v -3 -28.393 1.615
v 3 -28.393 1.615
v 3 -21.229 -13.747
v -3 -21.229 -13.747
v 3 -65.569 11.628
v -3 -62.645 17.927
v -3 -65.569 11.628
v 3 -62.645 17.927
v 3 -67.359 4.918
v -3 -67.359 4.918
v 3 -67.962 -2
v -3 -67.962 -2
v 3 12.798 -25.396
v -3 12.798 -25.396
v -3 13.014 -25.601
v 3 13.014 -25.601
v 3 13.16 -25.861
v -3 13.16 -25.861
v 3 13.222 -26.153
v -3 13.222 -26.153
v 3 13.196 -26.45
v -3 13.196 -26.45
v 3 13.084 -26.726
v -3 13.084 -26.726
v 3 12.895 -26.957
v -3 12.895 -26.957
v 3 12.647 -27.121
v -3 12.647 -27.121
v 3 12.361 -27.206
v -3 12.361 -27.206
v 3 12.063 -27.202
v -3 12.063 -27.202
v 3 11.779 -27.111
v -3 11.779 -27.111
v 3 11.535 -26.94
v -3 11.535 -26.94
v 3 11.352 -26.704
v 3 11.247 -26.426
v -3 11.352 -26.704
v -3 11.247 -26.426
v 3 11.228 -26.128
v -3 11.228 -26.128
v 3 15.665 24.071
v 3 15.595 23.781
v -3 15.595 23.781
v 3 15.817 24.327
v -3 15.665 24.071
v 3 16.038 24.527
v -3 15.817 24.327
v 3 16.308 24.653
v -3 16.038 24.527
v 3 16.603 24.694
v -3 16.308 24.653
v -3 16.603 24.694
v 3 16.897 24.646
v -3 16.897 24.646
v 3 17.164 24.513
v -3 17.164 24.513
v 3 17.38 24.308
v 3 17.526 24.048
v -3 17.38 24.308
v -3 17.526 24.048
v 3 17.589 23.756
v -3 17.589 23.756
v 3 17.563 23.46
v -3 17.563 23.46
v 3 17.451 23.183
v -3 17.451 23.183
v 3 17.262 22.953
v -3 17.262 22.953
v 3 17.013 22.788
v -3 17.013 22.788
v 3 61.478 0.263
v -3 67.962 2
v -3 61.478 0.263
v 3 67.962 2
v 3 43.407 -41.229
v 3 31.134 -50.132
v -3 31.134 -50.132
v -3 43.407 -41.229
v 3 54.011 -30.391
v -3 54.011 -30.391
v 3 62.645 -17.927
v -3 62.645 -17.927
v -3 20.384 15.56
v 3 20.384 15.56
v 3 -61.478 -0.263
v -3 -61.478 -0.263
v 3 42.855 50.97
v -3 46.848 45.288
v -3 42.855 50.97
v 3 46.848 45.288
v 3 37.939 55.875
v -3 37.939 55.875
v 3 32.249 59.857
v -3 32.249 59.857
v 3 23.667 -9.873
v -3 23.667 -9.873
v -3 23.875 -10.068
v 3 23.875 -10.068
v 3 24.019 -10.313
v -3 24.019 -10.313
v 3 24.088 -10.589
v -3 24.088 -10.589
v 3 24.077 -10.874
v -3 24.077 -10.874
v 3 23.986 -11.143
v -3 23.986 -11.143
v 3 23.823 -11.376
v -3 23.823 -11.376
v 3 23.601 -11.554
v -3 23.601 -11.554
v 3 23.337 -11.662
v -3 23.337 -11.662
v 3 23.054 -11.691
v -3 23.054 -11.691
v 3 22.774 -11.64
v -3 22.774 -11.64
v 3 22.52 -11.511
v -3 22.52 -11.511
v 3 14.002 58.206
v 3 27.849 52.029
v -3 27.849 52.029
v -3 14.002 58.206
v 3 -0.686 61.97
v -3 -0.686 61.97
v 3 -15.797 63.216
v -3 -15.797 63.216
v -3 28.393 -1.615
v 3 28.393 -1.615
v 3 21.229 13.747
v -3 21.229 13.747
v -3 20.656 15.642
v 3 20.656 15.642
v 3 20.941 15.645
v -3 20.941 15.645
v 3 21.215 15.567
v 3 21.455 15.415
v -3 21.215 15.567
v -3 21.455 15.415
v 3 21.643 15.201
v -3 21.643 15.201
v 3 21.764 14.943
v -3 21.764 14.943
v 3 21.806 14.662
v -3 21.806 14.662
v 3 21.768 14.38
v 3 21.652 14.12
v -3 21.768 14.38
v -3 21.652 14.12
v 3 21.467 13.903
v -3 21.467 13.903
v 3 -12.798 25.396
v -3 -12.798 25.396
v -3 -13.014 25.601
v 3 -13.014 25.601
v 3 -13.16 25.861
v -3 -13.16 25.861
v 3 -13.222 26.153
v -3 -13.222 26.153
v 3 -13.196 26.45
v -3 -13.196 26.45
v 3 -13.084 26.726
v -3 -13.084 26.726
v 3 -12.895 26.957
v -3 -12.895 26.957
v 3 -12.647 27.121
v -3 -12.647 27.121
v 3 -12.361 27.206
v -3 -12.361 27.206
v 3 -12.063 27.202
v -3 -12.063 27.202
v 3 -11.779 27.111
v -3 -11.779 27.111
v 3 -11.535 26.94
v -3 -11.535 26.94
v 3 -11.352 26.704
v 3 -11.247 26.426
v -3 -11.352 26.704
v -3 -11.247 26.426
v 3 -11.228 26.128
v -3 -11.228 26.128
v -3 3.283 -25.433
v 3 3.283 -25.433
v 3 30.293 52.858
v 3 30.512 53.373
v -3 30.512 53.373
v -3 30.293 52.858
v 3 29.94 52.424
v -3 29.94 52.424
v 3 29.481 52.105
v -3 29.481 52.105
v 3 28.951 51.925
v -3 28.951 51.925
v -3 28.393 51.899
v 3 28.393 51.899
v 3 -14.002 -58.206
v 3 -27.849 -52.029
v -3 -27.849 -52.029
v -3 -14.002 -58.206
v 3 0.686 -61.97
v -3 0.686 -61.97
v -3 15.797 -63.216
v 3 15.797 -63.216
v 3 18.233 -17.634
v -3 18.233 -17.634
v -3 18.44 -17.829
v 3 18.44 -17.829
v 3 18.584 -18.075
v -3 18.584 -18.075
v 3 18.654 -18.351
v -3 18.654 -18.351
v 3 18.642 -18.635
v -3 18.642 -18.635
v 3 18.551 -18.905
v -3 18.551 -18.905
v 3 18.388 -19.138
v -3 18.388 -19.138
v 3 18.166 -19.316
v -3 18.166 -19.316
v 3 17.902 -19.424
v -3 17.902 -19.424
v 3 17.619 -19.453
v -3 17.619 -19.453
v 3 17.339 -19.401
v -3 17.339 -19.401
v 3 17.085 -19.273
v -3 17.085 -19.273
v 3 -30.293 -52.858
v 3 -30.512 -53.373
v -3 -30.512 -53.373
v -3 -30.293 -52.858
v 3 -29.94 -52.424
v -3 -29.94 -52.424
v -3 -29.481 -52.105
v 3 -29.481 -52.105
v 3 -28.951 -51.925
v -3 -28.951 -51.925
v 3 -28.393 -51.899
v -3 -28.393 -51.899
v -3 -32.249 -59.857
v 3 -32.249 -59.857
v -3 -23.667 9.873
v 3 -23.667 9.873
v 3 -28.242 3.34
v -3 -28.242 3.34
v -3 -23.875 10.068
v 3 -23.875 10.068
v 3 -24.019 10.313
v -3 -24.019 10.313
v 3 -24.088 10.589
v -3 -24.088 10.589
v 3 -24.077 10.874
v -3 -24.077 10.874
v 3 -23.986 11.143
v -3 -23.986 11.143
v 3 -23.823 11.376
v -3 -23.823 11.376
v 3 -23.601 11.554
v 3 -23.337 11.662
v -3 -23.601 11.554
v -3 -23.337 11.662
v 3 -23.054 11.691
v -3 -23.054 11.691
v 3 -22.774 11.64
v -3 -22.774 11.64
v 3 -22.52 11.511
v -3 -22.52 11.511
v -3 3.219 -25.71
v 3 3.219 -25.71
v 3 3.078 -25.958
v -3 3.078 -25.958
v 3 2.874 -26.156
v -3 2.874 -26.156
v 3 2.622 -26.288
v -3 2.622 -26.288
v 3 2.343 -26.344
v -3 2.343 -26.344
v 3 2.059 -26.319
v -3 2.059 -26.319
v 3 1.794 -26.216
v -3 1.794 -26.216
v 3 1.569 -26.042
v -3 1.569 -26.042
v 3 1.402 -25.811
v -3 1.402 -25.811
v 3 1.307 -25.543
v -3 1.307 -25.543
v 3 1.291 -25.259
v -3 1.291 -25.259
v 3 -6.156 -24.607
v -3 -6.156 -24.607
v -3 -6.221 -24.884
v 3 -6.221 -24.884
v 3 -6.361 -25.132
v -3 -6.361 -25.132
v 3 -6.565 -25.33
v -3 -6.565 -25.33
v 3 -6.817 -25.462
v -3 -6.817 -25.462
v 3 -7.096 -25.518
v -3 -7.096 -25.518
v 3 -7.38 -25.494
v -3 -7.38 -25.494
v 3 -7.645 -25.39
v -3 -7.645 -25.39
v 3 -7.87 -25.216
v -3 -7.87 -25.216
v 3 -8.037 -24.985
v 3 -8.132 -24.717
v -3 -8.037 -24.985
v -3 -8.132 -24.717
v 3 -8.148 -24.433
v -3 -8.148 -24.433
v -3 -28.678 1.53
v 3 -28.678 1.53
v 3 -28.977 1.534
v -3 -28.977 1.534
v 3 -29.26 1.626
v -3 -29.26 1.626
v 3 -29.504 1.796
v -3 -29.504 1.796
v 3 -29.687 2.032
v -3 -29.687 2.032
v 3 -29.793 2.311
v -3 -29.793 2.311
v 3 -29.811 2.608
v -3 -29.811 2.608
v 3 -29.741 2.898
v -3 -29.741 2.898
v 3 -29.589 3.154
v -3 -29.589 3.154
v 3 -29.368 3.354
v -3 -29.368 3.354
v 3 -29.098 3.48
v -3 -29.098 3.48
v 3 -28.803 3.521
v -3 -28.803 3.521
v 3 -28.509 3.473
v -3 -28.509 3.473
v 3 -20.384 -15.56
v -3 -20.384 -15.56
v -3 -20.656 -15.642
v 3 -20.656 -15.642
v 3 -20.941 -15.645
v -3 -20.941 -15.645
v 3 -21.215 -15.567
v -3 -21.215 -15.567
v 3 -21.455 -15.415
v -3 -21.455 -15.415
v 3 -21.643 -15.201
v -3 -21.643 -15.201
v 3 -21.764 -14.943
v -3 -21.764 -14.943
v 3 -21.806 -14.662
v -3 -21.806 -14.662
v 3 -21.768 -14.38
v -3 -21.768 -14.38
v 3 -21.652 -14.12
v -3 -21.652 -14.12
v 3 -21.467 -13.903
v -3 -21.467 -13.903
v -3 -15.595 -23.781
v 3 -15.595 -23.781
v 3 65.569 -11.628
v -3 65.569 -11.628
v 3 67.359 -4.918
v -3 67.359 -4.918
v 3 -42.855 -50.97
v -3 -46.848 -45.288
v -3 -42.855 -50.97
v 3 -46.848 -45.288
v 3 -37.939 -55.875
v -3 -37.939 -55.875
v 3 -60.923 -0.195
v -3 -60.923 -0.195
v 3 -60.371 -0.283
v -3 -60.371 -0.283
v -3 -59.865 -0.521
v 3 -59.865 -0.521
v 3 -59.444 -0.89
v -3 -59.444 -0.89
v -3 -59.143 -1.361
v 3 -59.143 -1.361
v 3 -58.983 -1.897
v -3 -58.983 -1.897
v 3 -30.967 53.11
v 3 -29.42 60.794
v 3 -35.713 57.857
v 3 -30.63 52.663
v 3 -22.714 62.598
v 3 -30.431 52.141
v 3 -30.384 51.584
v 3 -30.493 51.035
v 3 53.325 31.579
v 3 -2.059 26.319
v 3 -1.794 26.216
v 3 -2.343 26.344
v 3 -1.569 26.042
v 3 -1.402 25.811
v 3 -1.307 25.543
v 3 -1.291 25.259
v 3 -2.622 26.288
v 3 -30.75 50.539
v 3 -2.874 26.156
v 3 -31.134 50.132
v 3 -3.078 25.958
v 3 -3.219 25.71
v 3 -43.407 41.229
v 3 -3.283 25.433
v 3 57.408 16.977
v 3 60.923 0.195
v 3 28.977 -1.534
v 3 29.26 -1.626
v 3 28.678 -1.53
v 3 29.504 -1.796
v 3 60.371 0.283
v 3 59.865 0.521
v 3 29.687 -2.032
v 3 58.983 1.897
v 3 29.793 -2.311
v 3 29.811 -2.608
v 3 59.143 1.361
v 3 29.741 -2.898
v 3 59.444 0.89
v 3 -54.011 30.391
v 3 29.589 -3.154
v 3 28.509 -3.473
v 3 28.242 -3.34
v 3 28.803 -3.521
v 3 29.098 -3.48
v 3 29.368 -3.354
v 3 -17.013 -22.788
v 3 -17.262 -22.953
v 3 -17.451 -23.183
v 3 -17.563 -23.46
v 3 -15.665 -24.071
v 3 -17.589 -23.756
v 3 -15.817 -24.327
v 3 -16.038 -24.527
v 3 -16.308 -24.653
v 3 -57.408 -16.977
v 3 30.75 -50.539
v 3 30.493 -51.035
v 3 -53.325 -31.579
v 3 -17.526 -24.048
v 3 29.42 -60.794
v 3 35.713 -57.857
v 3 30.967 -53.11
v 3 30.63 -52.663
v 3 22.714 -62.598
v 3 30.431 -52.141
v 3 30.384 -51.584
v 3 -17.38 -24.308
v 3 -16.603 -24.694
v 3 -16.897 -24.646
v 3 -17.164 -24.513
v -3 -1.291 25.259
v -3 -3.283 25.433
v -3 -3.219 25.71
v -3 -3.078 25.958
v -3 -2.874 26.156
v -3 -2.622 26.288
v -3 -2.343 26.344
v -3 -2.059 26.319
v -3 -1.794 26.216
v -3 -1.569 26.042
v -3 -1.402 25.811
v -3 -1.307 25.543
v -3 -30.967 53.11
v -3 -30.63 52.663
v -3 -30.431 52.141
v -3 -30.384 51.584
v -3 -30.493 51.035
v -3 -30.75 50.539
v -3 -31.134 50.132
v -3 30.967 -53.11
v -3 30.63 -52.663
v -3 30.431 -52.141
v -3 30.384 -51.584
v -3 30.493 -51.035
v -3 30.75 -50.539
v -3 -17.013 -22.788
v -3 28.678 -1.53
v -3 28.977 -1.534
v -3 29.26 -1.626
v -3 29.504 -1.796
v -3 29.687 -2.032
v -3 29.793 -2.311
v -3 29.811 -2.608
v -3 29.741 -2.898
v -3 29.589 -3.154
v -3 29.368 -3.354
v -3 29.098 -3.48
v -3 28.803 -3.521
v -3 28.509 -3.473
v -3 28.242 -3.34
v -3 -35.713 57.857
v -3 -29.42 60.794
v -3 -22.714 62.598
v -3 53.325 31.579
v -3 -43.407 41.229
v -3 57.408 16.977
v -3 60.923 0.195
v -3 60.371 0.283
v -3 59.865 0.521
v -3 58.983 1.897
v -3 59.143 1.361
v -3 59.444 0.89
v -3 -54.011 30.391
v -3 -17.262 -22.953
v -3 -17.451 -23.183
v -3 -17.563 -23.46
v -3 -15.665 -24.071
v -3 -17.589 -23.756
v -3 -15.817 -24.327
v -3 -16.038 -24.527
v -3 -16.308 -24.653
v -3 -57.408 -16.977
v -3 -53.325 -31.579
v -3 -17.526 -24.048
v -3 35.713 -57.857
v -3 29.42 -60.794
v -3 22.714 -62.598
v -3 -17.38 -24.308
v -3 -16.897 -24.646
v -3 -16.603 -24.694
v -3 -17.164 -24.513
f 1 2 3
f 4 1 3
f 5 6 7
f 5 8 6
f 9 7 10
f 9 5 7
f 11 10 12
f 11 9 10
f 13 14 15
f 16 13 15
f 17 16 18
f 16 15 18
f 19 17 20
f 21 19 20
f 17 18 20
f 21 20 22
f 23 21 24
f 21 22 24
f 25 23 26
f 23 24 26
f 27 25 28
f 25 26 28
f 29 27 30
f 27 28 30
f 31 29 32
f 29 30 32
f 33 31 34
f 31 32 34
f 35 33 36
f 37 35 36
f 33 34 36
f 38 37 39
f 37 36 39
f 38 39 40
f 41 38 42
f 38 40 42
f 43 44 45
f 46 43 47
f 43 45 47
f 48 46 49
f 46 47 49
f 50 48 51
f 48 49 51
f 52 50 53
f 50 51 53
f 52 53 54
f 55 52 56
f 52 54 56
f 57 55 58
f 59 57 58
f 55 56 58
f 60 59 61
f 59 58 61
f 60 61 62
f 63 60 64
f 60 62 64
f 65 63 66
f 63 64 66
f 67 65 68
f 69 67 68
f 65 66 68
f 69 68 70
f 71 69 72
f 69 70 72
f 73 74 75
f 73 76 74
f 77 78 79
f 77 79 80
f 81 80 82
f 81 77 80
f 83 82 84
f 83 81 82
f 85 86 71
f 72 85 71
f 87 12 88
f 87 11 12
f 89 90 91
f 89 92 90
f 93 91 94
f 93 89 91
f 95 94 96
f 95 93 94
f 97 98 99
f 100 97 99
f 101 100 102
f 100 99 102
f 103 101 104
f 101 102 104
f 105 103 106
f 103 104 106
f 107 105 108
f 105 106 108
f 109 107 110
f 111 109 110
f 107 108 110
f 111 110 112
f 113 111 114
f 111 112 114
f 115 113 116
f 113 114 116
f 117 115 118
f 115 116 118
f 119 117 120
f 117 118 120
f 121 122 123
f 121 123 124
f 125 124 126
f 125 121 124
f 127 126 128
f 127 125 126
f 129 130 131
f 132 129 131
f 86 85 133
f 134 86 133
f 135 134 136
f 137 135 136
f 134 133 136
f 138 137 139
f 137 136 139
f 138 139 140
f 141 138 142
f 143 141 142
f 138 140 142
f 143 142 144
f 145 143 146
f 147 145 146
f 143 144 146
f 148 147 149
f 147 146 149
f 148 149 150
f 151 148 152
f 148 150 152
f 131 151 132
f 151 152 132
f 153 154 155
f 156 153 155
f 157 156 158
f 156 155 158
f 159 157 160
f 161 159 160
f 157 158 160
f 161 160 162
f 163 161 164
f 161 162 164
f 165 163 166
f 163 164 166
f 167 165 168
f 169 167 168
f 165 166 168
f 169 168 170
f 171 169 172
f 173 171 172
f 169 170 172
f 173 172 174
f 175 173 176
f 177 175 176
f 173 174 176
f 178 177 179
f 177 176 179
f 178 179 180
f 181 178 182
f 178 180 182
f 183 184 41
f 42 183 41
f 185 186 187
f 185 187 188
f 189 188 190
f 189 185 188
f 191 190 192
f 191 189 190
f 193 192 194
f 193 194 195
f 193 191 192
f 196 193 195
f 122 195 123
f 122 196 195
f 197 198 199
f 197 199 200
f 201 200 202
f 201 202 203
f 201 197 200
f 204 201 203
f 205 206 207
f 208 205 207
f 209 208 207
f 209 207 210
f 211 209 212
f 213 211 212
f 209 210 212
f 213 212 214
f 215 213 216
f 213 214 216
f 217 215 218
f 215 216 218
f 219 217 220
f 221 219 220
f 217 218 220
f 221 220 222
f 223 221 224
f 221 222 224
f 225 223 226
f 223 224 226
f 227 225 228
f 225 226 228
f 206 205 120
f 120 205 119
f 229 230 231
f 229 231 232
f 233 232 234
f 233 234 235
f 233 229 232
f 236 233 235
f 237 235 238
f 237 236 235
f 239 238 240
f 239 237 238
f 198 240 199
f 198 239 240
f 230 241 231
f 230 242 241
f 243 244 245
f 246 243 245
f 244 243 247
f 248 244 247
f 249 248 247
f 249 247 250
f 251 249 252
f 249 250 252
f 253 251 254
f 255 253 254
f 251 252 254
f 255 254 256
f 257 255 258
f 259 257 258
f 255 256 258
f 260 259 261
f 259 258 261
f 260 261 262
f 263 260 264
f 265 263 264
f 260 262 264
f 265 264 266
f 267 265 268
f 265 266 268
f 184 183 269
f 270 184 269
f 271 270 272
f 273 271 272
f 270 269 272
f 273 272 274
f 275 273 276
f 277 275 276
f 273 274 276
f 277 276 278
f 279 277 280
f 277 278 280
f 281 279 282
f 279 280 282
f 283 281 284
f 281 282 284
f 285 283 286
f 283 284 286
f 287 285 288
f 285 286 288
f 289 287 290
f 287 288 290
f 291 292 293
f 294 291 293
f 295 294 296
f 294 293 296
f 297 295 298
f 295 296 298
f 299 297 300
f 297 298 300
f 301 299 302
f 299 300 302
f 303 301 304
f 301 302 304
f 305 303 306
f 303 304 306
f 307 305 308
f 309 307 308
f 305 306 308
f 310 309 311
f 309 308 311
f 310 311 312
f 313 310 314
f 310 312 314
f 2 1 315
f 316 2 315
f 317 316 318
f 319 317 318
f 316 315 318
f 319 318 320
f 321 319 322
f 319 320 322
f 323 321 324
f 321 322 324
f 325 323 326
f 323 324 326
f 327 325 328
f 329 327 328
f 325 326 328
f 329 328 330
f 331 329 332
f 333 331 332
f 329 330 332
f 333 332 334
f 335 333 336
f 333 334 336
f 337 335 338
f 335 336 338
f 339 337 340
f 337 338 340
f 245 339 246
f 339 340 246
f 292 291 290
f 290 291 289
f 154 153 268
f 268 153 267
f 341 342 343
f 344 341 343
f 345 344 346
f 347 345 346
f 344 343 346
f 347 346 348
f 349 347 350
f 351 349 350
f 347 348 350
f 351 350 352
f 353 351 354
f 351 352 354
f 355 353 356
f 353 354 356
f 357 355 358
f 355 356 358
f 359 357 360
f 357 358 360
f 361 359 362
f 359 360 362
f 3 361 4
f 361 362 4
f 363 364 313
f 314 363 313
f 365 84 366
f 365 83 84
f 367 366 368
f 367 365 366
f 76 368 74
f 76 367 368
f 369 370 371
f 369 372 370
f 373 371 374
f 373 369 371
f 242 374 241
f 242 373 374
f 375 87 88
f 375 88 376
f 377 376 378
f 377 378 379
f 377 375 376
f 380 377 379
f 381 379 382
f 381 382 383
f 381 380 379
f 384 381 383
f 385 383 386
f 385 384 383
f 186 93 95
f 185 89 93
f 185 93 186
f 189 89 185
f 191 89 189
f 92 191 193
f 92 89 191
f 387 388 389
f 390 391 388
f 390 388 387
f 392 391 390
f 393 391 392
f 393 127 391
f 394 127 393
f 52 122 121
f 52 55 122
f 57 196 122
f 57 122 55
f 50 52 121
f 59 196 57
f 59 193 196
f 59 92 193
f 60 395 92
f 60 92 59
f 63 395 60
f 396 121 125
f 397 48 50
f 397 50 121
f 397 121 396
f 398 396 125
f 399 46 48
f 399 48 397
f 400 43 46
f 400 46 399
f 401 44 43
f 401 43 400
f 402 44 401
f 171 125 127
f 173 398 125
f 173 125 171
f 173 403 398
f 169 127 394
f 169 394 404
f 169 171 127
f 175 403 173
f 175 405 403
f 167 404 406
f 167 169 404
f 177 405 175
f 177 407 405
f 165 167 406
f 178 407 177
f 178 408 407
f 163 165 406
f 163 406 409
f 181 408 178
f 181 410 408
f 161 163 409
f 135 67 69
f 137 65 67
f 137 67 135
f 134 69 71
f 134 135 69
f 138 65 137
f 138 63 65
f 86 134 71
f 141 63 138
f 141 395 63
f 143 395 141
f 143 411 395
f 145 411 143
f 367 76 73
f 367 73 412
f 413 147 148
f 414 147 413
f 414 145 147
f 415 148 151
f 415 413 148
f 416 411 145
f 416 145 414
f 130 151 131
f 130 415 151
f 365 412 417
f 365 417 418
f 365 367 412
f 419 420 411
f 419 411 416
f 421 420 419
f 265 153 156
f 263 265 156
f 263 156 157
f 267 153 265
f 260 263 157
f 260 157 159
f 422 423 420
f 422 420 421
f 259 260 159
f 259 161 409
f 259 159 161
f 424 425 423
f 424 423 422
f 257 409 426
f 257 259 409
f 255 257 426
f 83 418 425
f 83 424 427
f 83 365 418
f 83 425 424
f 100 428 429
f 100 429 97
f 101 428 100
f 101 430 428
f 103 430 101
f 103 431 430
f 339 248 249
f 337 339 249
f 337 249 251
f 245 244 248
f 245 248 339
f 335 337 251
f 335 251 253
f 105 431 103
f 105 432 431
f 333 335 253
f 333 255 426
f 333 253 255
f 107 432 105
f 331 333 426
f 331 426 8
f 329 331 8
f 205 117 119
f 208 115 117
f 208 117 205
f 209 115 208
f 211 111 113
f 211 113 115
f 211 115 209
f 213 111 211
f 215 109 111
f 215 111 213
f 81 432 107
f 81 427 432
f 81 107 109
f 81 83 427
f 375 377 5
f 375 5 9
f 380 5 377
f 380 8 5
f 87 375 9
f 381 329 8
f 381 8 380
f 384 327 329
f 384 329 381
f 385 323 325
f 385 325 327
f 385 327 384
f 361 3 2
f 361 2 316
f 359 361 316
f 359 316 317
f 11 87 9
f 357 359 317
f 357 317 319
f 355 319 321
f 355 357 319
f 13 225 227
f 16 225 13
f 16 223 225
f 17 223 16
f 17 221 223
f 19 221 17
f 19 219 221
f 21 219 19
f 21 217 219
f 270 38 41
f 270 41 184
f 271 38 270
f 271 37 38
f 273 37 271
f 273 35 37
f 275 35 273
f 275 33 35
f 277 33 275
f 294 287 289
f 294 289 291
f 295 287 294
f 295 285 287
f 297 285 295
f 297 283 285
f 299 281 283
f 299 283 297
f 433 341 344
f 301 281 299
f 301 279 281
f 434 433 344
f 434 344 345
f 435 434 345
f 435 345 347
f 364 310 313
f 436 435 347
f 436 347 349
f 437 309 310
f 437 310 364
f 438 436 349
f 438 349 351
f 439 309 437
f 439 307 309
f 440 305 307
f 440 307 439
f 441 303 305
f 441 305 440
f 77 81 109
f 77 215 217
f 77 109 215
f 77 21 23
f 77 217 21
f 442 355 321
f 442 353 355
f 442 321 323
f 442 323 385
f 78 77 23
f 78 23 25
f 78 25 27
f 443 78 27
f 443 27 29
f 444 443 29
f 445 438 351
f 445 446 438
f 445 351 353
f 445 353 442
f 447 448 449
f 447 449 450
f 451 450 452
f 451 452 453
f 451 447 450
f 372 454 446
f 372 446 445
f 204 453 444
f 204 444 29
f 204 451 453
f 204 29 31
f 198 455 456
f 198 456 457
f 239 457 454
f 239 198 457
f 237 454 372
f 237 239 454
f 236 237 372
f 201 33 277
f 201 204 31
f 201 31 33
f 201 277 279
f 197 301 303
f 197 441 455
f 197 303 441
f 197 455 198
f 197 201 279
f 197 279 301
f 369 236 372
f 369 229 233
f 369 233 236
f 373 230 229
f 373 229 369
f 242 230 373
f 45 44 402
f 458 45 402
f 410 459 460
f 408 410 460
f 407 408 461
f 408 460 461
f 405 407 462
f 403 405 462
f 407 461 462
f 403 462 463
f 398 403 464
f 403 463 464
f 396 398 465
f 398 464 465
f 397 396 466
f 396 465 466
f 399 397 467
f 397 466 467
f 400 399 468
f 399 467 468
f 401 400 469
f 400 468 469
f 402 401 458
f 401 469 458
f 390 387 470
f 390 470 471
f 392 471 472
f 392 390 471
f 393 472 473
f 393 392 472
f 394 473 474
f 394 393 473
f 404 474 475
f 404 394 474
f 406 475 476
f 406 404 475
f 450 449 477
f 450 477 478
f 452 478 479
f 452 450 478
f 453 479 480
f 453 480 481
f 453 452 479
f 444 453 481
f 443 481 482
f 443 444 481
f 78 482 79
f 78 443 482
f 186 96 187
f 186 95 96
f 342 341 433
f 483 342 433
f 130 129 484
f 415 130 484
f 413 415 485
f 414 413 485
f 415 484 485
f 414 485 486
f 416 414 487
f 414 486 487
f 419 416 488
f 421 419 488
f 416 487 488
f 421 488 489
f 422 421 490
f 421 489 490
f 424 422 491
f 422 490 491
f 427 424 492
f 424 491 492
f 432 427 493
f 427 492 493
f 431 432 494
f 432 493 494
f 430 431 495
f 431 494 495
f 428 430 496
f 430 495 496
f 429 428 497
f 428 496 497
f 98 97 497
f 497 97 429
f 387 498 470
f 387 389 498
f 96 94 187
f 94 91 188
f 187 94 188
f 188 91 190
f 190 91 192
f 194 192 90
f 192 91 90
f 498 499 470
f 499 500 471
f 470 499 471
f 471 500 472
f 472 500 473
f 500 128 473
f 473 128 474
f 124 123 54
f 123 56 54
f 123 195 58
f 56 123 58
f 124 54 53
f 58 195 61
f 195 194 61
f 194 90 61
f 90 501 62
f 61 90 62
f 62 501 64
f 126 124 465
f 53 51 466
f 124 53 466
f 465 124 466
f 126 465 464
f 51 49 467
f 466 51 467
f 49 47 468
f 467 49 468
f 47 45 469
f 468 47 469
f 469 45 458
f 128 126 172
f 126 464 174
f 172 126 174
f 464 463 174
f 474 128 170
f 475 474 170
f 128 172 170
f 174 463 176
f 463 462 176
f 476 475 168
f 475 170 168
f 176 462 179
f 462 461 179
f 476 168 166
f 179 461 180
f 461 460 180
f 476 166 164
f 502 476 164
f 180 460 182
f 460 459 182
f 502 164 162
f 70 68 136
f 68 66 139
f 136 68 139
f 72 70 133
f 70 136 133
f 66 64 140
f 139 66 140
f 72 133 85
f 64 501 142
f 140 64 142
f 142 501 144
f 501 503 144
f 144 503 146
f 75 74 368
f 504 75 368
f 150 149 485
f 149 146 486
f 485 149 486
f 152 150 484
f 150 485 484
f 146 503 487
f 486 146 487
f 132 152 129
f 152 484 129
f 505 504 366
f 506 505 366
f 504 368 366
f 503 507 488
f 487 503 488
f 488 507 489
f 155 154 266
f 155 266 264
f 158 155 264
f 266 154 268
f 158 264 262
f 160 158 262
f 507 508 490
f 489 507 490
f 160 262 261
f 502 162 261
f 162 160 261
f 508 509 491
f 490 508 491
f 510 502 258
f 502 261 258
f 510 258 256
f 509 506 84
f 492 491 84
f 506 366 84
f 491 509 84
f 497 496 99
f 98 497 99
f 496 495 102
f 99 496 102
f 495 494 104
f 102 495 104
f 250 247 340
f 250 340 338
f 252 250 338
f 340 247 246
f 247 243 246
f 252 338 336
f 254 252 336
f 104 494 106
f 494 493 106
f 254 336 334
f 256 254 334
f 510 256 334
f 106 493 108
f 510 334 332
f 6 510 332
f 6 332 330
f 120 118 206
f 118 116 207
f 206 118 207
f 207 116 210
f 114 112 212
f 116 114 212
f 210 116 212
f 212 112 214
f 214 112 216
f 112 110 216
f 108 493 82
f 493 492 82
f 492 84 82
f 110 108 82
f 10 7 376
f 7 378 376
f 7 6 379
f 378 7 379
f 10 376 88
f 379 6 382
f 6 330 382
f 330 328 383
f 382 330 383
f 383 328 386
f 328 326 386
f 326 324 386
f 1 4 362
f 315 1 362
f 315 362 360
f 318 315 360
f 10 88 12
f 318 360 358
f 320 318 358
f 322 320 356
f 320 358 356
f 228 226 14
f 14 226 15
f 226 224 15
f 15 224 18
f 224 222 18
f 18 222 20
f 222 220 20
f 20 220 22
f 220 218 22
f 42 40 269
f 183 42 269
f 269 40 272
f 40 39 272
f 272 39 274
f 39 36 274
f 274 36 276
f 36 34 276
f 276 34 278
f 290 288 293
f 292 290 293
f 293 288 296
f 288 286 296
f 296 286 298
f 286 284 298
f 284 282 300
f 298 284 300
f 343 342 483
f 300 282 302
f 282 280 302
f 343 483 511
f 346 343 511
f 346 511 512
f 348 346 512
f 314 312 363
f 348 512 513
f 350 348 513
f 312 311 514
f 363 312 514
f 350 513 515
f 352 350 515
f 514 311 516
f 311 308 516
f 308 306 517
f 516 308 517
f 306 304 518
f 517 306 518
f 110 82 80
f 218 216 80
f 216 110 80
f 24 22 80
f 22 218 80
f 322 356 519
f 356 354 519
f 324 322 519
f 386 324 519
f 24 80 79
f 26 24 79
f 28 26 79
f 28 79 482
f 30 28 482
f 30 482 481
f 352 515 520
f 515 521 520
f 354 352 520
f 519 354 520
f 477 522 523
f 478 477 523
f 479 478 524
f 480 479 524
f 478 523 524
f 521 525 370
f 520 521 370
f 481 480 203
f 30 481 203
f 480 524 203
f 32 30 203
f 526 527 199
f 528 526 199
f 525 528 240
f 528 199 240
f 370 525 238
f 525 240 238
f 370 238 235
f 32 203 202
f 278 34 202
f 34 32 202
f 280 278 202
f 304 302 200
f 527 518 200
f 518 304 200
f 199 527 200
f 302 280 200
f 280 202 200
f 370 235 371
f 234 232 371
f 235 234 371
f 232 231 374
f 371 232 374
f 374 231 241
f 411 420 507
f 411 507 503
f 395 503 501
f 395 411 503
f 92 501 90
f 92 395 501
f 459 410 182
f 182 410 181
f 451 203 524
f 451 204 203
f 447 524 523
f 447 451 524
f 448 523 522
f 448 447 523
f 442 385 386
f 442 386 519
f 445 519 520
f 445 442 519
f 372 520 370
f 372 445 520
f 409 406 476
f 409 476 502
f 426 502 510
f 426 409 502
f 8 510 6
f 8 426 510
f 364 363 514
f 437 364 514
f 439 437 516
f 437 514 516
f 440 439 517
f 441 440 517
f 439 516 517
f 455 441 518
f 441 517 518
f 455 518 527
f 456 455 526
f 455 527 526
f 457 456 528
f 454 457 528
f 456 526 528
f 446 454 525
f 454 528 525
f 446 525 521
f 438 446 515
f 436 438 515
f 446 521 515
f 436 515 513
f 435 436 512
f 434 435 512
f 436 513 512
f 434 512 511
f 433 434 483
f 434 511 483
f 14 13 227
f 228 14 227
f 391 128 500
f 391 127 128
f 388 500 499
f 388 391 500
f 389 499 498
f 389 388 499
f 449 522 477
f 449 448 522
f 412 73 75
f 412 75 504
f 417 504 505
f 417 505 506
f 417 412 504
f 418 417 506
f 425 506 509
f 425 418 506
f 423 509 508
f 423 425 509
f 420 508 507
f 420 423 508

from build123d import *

# Parameters (mm, degrees)
SKETCH1_R                = 59
EXTRUDE1_DEPTH           = 3
EXTRUDE2_DEPTH           = 3
CIRPATTERN1_COUNT        = 6
F_2_0_2_DIAMETER_HOLE1_D = 2
F_2_0_2_DIAMETER_HOLE3_D = 2
F_2_0_2_DIAMETER_HOLE4_D = 2
CIRPATTERN2_COUNT        = 6
CIRPATTERN3_COUNT        = 2
CIRPATTERN3_ANGLE        = 60


with BuildPart() as part:
    # Sketch1 → Extrude1 (new, symmetric)
    with BuildSketch(Plane(origin=(0, 0, 0), x_dir=(0, 0, -1), z_dir=(1, 0, 0))):
        Circle(SKETCH1_R)
        Polygon((26.215177945, 12.224338236), (2.521001516, 28.815179183), (-23.694176429, 16.590840947), (-26.215177945, -12.224338236), (-2.521001516, -28.815179183), (23.694176429, -16.590840947), align=None, mode=Mode.SUBTRACT)
    extrude(amount=EXTRUDE1_DEPTH, both=True)

    # Sketch2 → Extrude2 (add, symmetric)
    with BuildSketch(Plane(origin=(0, 0, 0), x_dir=(0, 0, -1), z_dir=(1, 0, 0))):
        with BuildLine():
            Line((-2, 67.961805723), (-0.262709442, 61.478149092))
            ThreePointArc((-0.262709442, 61.478149092), (-0.58620663, 59.77173183), (-2.122608272, 58.961805723))
            ThreePointArc((-2.122608272, 58.961805723), (28.679663449, 51.560419941), (51.21368579, 29.294340542))
            ThreePointArc((51.21368579, 29.294340542), (36.791707484, 48.186627241), (17.927108603, 62.644803614))
            ThreePointArc((17.927108603, 62.644803614), (8.312130826, 66.609702921), (-2, 67.961805723))
        make_face()
    extrude2 = extrude(amount=EXTRUDE2_DEPTH, both=True)

    # CirPattern1: Extrude2 ×6 about axis
    cirpattern1_axis = Axis((0, 0, 0), (1, 0, 0))
    for i in range(1, CIRPATTERN1_COUNT):
        add(extrude2.rotate(cirpattern1_axis, i * 360 / CIRPATTERN1_COUNT))

    # 2.0 _2_ Diameter Hole1 (through all)
    with Locations(Plane(origin=(3, 0, 0), x_dir=(0, 0, -1), z_dir=(1, 0, 0))):
        with Locations((2.521001516, 28.815179183), (26.215177945, 12.224338236), (23.694176429, -16.590840947), (-2.521001516, -28.815179183), (-26.215177945, -12.224338236), (-23.694176429, 16.590840947)):
            Hole(F_2_0_2_DIAMETER_HOLE1_D / 2)

    # 2.0 _2_ Diameter Hole3 (through all)
    with Locations(Plane(origin=(3, 0, 0), x_dir=(0, 0, -1), z_dir=(1, 0, 0))):
        with Locations((10.692111007, 23.093706722)):
            f_2_0_2_diameter_hole3 = Hole(F_2_0_2_DIAMETER_HOLE3_D / 2)

    # 2.0 _2_ Diameter Hole4 (through all)
    with Locations(Plane(origin=(3, 0, 0), x_dir=(0, 0, -1), z_dir=(1, 0, 0))):
        with Locations((18.453644476, 17.659022479)):
            f_2_0_2_diameter_hole4 = Hole(F_2_0_2_DIAMETER_HOLE4_D / 2)

    # CirPattern2: 2.0 _2_ Diameter Hole3 ×6 about axis
    cirpattern2_axis = Axis((0, 0, 0), (1, 0, 0))
    for i in range(1, CIRPATTERN2_COUNT):
        add(f_2_0_2_diameter_hole3.rotate(cirpattern2_axis, i * 360 / CIRPATTERN2_COUNT), mode=Mode.SUBTRACT)

    # CirPattern3: 2.0 _2_ Diameter Hole4 ×2 about axis
    cirpattern3_axis = Axis((-5.5, 0, 0), (-1, 0, 0))
    for i in range(1, CIRPATTERN3_COUNT):
        add(f_2_0_2_diameter_hole4.rotate(cirpattern3_axis, i * CIRPATTERN3_ANGLE / (CIRPATTERN3_COUNT - 1)), mode=Mode.SUBTRACT)


solid = part.part
